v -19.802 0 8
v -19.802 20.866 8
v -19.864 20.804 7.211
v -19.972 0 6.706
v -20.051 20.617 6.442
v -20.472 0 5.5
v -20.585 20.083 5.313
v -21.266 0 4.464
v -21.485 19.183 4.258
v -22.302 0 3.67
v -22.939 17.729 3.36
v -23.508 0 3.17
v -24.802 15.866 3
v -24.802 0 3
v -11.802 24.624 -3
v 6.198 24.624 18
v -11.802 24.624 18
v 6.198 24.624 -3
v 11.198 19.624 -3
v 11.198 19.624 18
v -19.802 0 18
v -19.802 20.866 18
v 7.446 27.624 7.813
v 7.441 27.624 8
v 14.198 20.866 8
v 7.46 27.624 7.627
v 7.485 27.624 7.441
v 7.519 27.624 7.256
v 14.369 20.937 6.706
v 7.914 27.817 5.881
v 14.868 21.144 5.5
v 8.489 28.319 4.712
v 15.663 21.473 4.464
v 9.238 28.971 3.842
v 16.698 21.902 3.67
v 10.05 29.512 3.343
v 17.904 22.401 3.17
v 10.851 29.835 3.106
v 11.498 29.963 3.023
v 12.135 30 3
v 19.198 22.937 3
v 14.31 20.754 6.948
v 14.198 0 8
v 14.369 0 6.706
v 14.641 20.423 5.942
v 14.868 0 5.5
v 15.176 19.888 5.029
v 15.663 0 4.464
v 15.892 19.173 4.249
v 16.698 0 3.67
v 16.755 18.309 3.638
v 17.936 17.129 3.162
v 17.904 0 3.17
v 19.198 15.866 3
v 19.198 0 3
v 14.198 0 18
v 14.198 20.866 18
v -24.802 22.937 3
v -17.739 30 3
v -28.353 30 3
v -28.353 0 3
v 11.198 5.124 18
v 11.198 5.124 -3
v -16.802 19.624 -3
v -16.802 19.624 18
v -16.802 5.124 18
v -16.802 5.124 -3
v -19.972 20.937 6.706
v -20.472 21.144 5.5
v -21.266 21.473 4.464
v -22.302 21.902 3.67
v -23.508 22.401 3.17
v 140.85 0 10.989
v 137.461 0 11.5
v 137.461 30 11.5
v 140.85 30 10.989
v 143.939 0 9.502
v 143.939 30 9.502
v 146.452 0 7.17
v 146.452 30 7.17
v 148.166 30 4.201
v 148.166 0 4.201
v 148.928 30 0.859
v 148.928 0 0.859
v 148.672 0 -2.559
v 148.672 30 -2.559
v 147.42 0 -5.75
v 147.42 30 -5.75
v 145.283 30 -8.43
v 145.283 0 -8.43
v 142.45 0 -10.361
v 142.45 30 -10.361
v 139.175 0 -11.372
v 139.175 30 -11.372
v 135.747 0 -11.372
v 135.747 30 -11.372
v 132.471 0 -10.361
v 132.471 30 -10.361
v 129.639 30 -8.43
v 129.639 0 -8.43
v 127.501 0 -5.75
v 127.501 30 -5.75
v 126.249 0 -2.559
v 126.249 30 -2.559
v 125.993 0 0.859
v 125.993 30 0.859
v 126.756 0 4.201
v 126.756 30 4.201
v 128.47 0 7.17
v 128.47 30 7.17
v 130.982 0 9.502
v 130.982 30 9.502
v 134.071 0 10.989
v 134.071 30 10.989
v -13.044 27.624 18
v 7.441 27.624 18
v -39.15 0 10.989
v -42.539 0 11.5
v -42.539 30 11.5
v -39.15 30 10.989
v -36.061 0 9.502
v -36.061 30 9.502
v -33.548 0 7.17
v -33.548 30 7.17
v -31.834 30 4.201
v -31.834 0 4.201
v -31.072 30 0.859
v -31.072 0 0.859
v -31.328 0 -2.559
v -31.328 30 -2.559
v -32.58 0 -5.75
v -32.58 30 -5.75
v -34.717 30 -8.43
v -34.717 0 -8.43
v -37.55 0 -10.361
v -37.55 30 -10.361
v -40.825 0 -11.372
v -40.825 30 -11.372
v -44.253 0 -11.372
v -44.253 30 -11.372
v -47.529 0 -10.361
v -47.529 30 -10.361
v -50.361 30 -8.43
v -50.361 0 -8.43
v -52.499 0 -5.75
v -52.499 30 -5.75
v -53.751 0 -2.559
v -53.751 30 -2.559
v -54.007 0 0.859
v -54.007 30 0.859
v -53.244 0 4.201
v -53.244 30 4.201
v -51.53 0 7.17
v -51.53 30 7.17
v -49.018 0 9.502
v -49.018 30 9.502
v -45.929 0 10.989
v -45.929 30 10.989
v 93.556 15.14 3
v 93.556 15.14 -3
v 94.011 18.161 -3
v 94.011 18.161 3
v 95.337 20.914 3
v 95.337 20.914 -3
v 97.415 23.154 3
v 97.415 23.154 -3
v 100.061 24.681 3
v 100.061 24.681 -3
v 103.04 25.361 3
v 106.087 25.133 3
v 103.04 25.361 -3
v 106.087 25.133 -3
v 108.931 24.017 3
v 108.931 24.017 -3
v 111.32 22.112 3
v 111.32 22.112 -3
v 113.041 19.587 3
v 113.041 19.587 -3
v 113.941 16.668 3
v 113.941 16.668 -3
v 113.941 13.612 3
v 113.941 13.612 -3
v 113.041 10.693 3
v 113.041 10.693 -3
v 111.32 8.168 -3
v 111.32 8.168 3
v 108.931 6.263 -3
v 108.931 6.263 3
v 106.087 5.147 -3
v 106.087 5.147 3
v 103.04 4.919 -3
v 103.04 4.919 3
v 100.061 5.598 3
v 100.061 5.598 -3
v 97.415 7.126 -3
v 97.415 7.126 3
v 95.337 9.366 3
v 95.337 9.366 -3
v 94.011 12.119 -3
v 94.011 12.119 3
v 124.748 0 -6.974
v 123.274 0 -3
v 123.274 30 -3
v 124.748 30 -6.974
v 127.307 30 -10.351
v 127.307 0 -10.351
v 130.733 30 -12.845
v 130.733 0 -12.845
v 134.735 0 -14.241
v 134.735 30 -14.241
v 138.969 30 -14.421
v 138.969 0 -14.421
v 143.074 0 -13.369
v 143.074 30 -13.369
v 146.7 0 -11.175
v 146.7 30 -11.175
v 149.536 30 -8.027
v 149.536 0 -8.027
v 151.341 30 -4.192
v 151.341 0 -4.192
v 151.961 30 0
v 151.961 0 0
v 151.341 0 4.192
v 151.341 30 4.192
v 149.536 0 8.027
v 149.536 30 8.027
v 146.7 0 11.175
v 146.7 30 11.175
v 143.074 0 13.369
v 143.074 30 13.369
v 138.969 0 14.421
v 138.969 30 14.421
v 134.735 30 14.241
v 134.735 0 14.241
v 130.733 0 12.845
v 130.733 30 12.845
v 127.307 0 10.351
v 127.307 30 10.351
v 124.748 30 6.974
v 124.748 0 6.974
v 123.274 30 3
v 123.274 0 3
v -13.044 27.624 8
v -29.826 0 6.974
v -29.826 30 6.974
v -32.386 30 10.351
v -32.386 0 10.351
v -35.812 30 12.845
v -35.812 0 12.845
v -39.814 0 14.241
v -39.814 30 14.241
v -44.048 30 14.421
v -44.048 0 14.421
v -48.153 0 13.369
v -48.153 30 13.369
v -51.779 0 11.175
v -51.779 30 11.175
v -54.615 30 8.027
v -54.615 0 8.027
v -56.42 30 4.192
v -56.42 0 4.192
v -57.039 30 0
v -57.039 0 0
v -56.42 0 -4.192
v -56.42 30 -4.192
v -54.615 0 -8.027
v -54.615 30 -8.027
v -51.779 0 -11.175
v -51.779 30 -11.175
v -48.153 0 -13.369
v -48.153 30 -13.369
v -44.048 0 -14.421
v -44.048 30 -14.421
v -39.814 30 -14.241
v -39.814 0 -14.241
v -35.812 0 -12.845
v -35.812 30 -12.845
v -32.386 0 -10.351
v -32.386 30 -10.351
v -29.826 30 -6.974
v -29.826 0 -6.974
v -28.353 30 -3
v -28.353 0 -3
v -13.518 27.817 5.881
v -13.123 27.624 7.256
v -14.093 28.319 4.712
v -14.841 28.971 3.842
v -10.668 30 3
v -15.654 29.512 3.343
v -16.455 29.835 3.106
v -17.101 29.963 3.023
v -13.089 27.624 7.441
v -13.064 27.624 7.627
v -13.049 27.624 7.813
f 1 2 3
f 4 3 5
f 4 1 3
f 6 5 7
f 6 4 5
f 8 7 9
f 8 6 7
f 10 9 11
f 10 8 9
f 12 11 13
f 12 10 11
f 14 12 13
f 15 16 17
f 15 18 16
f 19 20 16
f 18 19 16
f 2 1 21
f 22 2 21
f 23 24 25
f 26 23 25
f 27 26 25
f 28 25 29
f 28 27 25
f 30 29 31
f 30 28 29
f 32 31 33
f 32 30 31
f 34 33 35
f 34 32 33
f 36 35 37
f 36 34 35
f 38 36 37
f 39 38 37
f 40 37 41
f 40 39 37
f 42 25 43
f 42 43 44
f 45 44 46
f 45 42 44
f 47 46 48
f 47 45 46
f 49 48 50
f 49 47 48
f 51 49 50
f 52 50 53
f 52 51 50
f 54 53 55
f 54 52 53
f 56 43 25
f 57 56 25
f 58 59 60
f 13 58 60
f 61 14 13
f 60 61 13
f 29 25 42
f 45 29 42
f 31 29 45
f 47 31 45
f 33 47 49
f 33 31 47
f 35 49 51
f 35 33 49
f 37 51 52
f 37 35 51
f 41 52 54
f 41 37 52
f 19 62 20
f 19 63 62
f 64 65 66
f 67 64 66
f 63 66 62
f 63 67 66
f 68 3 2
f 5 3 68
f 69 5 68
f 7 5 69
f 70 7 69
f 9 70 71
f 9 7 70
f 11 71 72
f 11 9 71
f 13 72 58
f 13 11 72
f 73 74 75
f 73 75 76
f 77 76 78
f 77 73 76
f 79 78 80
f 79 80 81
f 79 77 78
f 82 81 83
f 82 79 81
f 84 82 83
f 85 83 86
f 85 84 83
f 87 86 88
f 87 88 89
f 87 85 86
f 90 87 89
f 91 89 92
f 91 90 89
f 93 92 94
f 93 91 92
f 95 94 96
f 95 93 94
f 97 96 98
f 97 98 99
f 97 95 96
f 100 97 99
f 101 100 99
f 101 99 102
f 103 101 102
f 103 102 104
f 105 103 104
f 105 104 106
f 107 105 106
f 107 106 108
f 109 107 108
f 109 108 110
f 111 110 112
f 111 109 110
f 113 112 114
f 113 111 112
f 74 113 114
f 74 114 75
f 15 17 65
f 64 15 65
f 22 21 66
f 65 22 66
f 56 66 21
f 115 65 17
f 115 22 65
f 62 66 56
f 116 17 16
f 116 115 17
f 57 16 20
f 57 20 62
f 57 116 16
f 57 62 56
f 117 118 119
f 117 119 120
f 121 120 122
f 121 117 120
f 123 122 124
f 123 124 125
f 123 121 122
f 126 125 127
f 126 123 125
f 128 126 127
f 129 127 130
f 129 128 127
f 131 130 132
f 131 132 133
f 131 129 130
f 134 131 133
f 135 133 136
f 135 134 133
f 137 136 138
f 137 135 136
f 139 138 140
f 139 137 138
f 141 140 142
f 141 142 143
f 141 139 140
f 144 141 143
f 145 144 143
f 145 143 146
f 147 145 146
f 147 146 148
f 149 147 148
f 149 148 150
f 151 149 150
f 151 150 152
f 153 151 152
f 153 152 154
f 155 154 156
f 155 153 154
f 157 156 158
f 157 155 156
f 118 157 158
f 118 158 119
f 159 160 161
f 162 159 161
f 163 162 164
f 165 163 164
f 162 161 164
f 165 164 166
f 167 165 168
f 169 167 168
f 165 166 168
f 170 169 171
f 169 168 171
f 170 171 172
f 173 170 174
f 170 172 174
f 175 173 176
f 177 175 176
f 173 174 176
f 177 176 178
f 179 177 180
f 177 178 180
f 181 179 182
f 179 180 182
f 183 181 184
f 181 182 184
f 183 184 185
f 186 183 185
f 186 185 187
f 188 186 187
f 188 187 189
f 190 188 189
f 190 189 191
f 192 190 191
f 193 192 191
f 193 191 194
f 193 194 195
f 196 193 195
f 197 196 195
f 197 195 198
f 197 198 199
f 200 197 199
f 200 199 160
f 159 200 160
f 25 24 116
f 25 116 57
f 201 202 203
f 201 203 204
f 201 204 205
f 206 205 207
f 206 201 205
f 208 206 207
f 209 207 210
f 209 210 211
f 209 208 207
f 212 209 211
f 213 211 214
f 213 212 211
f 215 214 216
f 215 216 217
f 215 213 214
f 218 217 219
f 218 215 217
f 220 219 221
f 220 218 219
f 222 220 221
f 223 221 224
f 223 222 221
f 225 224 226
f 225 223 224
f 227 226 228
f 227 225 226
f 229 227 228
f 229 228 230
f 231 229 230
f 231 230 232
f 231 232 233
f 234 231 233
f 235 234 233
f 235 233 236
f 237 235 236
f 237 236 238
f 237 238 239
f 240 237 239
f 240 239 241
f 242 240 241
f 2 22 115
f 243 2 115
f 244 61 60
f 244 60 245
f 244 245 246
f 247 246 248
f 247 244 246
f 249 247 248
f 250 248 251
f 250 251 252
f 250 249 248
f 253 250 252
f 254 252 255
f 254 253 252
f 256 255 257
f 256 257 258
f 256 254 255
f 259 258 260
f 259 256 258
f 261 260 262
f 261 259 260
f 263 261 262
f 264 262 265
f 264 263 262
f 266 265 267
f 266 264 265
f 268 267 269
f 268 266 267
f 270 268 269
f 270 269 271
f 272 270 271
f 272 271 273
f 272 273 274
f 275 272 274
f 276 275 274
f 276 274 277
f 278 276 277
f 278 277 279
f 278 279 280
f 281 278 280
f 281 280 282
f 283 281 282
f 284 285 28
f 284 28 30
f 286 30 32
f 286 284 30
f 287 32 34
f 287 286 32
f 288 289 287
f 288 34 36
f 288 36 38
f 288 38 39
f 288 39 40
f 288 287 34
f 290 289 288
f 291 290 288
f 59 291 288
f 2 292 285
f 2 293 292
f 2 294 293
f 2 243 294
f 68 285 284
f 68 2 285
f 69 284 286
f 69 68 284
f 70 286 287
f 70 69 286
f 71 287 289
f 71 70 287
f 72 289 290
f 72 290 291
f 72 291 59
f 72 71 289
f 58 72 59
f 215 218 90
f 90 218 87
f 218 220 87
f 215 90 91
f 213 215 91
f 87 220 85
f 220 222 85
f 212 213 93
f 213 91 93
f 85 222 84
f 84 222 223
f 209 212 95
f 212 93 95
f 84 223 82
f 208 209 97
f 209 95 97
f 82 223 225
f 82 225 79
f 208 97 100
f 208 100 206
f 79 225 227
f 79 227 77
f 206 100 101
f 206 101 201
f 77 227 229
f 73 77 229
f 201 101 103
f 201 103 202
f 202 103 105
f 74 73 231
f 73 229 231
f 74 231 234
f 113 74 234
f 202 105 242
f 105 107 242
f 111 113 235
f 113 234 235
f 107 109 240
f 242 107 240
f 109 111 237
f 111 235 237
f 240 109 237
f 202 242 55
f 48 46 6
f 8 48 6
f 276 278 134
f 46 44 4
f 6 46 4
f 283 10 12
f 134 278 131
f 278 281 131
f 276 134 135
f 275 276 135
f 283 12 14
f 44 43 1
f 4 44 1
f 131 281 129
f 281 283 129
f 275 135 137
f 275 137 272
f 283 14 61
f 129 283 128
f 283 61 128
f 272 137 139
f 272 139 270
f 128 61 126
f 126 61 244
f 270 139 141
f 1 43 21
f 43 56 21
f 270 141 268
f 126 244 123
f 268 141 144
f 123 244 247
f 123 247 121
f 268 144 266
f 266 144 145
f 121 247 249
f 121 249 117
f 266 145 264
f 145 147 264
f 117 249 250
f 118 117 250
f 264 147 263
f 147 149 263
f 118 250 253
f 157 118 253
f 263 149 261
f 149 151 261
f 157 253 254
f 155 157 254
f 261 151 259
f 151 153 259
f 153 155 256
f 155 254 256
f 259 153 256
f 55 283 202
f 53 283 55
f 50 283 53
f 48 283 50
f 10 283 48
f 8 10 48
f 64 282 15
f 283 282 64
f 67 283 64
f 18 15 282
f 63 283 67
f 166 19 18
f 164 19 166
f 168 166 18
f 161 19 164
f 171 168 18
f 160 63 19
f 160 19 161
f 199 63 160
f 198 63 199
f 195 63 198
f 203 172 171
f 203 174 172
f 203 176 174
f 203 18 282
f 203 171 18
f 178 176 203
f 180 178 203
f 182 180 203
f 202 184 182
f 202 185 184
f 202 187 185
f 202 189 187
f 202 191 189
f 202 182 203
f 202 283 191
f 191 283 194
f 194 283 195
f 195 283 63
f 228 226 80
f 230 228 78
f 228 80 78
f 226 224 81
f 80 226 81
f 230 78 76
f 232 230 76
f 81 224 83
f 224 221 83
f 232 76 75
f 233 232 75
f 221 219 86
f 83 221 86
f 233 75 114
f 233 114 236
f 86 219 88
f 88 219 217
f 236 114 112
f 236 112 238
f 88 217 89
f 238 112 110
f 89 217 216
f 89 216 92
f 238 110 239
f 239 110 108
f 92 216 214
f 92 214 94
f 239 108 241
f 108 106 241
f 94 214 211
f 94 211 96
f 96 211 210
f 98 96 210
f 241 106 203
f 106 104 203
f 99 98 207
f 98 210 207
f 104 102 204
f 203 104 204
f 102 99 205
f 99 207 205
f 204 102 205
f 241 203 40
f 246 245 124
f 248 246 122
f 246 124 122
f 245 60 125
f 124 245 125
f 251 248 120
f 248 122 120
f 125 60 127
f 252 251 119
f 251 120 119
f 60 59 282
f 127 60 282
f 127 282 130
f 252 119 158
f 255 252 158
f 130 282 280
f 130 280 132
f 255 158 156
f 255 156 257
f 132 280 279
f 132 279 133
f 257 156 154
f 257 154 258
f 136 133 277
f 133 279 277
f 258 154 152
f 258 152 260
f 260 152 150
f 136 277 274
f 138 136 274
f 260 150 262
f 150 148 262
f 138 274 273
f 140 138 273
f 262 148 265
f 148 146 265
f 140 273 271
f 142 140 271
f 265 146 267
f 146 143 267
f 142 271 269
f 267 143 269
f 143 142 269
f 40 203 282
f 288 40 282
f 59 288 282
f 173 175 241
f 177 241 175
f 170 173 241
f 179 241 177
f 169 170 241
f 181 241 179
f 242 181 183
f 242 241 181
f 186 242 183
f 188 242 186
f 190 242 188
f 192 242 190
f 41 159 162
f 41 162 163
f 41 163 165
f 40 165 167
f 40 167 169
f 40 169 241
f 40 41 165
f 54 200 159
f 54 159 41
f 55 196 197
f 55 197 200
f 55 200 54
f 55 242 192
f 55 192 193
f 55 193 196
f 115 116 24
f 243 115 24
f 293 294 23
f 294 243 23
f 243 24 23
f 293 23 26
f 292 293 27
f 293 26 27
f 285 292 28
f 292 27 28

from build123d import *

# Parameters (mm, degrees)
SKETCH1_R           = 11.5
BOSS_EXTRUDE1_DEPTH = 30
CUT_EXTRUDE1_DEPTH  = 10
BOSS_EXTRUDE2_DEPTH = 15
SKETCH4_W           = 34
SKETCH4_H           = 2.123618691
BOSS_EXTRUDE3_DEPTH = 15
FILLET1_R           = 5
SKETCH5_R           = 10.25
CUT_EXTRUDE2_DEPTH  = 15


with BuildPart() as part:
    # Sketch1 → Boss-Extrude1 (new body)
    with BuildSketch(Plane(origin=(0, 0, 0), x_dir=(1, 0, 0), z_dir=(0, 1, 0))):
        with BuildLine():
            Line((-28.353157483, 3), (123.274320599, 3))
            ThreePointArc((123.274320599, 3), (151.960581558, 0), (123.274320599, -3))
            Line((123.274320599, -3), (-28.353157483, -3))
            ThreePointArc((-28.353157483, -3), (-57.039418442, 0), (-28.353157483, 3))
        make_face()
        with Locations(Location((-42.539418442, 0, 0), (0, 0, 270))):
            Circle(SKETCH1_R, mode=Mode.SUBTRACT)
        with Locations(Location((137.460581558, 0, 0), (0, 0, 270))):
            Circle(SKETCH1_R, mode=Mode.SUBTRACT)
    extrude(amount=BOSS_EXTRUDE1_DEPTH)

    # Sketch2 → Cut-Extrude1 (cut)
    with BuildSketch(Plane.XY.offset(3)):
        Polygon((6.198144817, 24.623618691), (-11.801855183, 24.623618691), (-16.801855183, 19.623618691), (-16.801855183, 5.123618691), (11.198144817, 5.123618691), (11.198144817, 19.623618691), align=None)
    extrude(amount=-CUT_EXTRUDE1_DEPTH, mode=Mode.SUBTRACT)

    # Sketch3 → Boss-Extrude2 (add)
    with BuildSketch(Plane.XY.offset(3)):
        Polygon((-13.044495871, 27.623618691), (7.440785504, 27.623618691), (14.198144817, 20.866259379), (14.198144817, 2.123618691), (-19.801855183, 2.123618691), (-19.801855183, 20.866259379), align=None)
        Polygon((-11.801855183, 24.623618691), (-16.801855183, 19.623618691), (-16.801855183, 5.123618691), (11.198144817, 5.123618691), (11.198144817, 19.623618691), (6.198144817, 24.623618691), align=None, mode=Mode.SUBTRACT)
    extrude(amount=BOSS_EXTRUDE2_DEPTH)

    # Sketch4 → Boss-Extrude3 (add)
    with BuildSketch(Plane.XY.offset(3)):
        with Locations((-2.801855183, 1.061809346)):
            Rectangle(SKETCH4_W, SKETCH4_H)
    extrude(amount=BOSS_EXTRUDE3_DEPTH)

    # Fillet1
    # the kernel refuses this fillet: 5 mm, written as the material it adds along each edge
    with BuildSketch(Plane(origin=(-28.640689948, 12.027424614, 3), x_dir=(-0.7071067811865481, 0.7071067811865469, 0), z_dir=(0.707106781186547, 0.7071067811865481, 0))) as fillet1_piece_1_section:
        with BuildLine():
            CenterArc((FILLET1_R, FILLET1_R), FILLET1_R, 180, 90)
            Line((0, FILLET1_R), (0, 0))
            Line((0, 0), (FILLET1_R, 0))
        make_face()
    fillet1_piece_1 = extrude(amount=34.556349186, mode=Mode.PRIVATE)
    fillet1_piece_1 = split(fillet1_piece_1, bisect_by=Plane(origin=(-28.640689948, 27.623618691, 3), z_dir=(0, -1, 0)), keep=Keep.TOP, mode=Mode.PRIVATE)
    fillet1_piece_1 = split(fillet1_piece_1, bisect_by=Plane(origin=(-19.801855183, 12.027424614, 3), z_dir=(1, 0, 0)), keep=Keep.TOP, mode=Mode.PRIVATE)
    add(fillet1_piece_1)
    with BuildSketch(Plane(origin=(-28.640689948, 12.027424614, 3), x_dir=(-0.7071067811865481, 0.7071067811865469, 0), z_dir=(0.707106781186547, 0.7071067811865481, 0))) as fillet1_piece_2_section:
        with BuildLine():
            CenterArc((FILLET1_R, FILLET1_R), FILLET1_R, 180, 90)
            Line((0, FILLET1_R), (0, 0))
            Line((0, 0), (FILLET1_R, 0))
        make_face()
    fillet1_piece_2 = extrude(amount=34.556349186, mode=Mode.PRIVATE)
    fillet1_piece_2 = split(fillet1_piece_2, bisect_by=Plane(origin=(-28.640689948, 27.623618691, 3), z_dir=(0, 1, 0)), keep=Keep.TOP, mode=Mode.PRIVATE)
    fillet1_piece_2 = split(fillet1_piece_2, bisect_by=Plane(origin=(-19.801855183, 12.027424614, 3), z_dir=(-1, 0, 0)), keep=Keep.TOP, mode=Mode.PRIVATE)
    add(fillet1_piece_2)
    with BuildSketch(Plane(origin=(-19.801855183, 0, 3), x_dir=(-1, 0, 0), z_dir=(0, 1, 0))) as fillet1_piece_3_section:
        with BuildLine():
            CenterArc((FILLET1_R, FILLET1_R), FILLET1_R, 180, 90)
            Line((0, FILLET1_R), (0, 0))
            Line((0, 0), (FILLET1_R, 0))
        make_face()
    fillet1_piece_3 = extrude(amount=33.366259379, mode=Mode.PRIVATE)
    fillet1_piece_3 = split(fillet1_piece_3, bisect_by=Plane(origin=(-30.234984873, 10.433129689, 3), z_dir=(0.7071067811865481, -0.707106781186547, 0)), keep=Keep.TOP, mode=Mode.PRIVATE)
    add(fillet1_piece_3)
    with BuildSketch(Plane(origin=(14.198144817, 33.366259379, 3), x_dir=(1, 0, 0), z_dir=(0, -1, 0))) as fillet1_piece_4_section:
        with BuildLine():
            CenterArc((FILLET1_R, FILLET1_R), FILLET1_R, 180, 90)
            Line((0, FILLET1_R), (0, 0))
            Line((0, 0), (FILLET1_R, 0))
        make_face()
    fillet1_piece_4 = extrude(amount=33.366259379, mode=Mode.PRIVATE)
    fillet1_piece_4 = split(fillet1_piece_4, bisect_by=Plane(origin=(7.948144817, 27.116259379, 3), z_dir=(-0.7071067811865476, -0.7071067811865476, 0)), keep=Keep.TOP, mode=Mode.PRIVATE)
    add(fillet1_piece_4)
    with BuildSketch(Plane(origin=(-1.398049261, 36.462453456, 3), x_dir=(0.7071067811865475, 0.7071067811865475, 0), z_dir=(0.7071067811865476, -0.7071067811865476, 0))) as fillet1_piece_5_section:
        with BuildLine():
            CenterArc((FILLET1_R, FILLET1_R), FILLET1_R, 180, 90)
            Line((0, FILLET1_R), (0, 0))
            Line((0, 0), (FILLET1_R, 0))
        make_face()
    fillet1_piece_5 = extrude(amount=34.556349186, mode=Mode.PRIVATE)
    fillet1_piece_5 = split(fillet1_piece_5, bisect_by=Plane(origin=(14.198144817, 36.462453456, 3), z_dir=(-1, 0, 0)), keep=Keep.TOP, mode=Mode.PRIVATE)
    fillet1_piece_5 = split(fillet1_piece_5, bisect_by=Plane(origin=(-1.398049261, 27.623618691, 3), z_dir=(0, -1, 0)), keep=Keep.TOP, mode=Mode.PRIVATE)
    add(fillet1_piece_5)
    with BuildSketch(Plane(origin=(-1.398049261, 36.462453456, 3), x_dir=(0.7071067811865475, 0.7071067811865475, 0), z_dir=(0.7071067811865476, -0.7071067811865476, 0))) as fillet1_piece_6_section:
        with BuildLine():
            CenterArc((FILLET1_R, FILLET1_R), FILLET1_R, 180, 90)
            Line((0, FILLET1_R), (0, 0))
            Line((0, 0), (FILLET1_R, 0))
        make_face()
    fillet1_piece_6 = extrude(amount=34.556349186, mode=Mode.PRIVATE)
    fillet1_piece_6 = split(fillet1_piece_6, bisect_by=Plane(origin=(14.198144817, 36.462453456, 3), z_dir=(1, 0, 0)), keep=Keep.TOP, mode=Mode.PRIVATE)
    fillet1_piece_6 = split(fillet1_piece_6, bisect_by=Plane(origin=(-1.398049261, 27.623618691, 3), z_dir=(0, 1, 0)), keep=Keep.TOP, mode=Mode.PRIVATE)
    add(fillet1_piece_6)
    with BuildSketch(Plane(origin=(-23.685403069, 27.623618691, 3), x_dir=(0, 1, 0), z_dir=(1, 0, 0))) as fillet1_piece_7_section:
        with BuildLine():
            CenterArc((5, 4.256362879), FILLET1_R, 180, 58.350352686)
            Line((0, 4.256362879), (0, 0))
            Line((0, 0), (2.376381309, 0))
        make_face()
    fillet1_piece_7 = extrude(amount=41.767095772, mode=Mode.PRIVATE)
    fillet1_piece_7 = split(fillet1_piece_7, bisect_by=Plane(origin=(-8.122308783, 43.186712978, 3), z_dir=(-0.7071067811865476, -0.7071067811865476, 0)), keep=Keep.TOP, mode=Mode.PRIVATE)
    fillet1_piece_7 = split(fillet1_piece_7, bisect_by=Plane(origin=(-18.36494947, 22.303165092, 3), z_dir=(0.7071067811865481, -0.707106781186547, 0)), keep=Keep.TOP, mode=Mode.PRIVATE)
    add(fillet1_piece_7)
    with BuildSketch(Plane(origin=(-19.801855183, 0, 3), x_dir=(-1, 0, 0), z_dir=(0, 1, 0))) as fillet1_piece_8a_section:
        with BuildLine():
            CenterArc((FILLET1_R, FILLET1_R), FILLET1_R, 180, 90)
            Line((0, FILLET1_R), (0, 0))
            Line((0, 0), (FILLET1_R, 0))
        make_face()
    fillet1_piece_8a = extrude(amount=33.366259379, mode=Mode.PRIVATE)
    fillet1_piece_8a = split(fillet1_piece_8a, bisect_by=Plane(origin=(-30.234984873, 10.433129689, 3), z_dir=(-0.7071067811865481, 0.707106781186547, 0)), keep=Keep.TOP, mode=Mode.PRIVATE)
    fillet1_piece_8a = split(fillet1_piece_8a, bisect_by=Plane(origin=(-19.801855183, 30, 3), z_dir=(0, -1, 0)), keep=Keep.TOP, mode=Mode.PRIVATE)
    with BuildSketch(Plane(origin=(-28.640689948, 12.027424614, 3), x_dir=(-0.7071067811865481, 0.7071067811865469, 0), z_dir=(0.707106781186547, 0.7071067811865481, 0))) as fillet1_piece_8b_section:
        with BuildLine():
            CenterArc((FILLET1_R, FILLET1_R), FILLET1_R, 180, 90)
            Line((0, FILLET1_R), (0, 0))
            Line((0, 0), (FILLET1_R, 0))
        make_face()
    fillet1_piece_8b = extrude(amount=34.556349186, mode=Mode.PRIVATE)
    fillet1_piece_8b = split(fillet1_piece_8b, bisect_by=Plane(origin=(-19.801855183, 12.027424614, 3), z_dir=(-1, 0, 0)), keep=Keep.TOP, mode=Mode.PRIVATE)
    fillet1_piece_8b = fillet1_piece_8b - Plane(origin=(-42.539418442, 12.027424614, 0), x_dir=(0.9783628247662832, 0, 0.20689655172413826), z_dir=(0, -1, 0)) * Cylinder(14.5, 90, mode=Mode.PRIVATE)
    fillet1_piece_8 = fillet1_piece_8a & fillet1_piece_8b
    add(fillet1_piece_8)
    with BuildSketch(Plane(origin=(-28.640689948, 12.027424614, 3), x_dir=(-0.7071067811865481, 0.7071067811865469, 0), z_dir=(0.707106781186547, 0.7071067811865481, 0))) as fillet1_piece_9a_section:
        with BuildLine():
            CenterArc((FILLET1_R, FILLET1_R), FILLET1_R, 180, 90)
            Line((0, FILLET1_R), (0, 0))
            Line((0, 0), (FILLET1_R, 0))
        make_face()
    fillet1_piece_9a = extrude(amount=34.556349186, mode=Mode.PRIVATE)
    fillet1_piece_9a = split(fillet1_piece_9a, bisect_by=Plane(origin=(-28.640689948, 27.623618691, 3), z_dir=(0, 1, 0)), keep=Keep.TOP, mode=Mode.PRIVATE)
    fillet1_piece_9a = split(fillet1_piece_9a, bisect_by=Plane(origin=(-28.640689948, 30, 3), z_dir=(0, -1, 0)), keep=Keep.TOP, mode=Mode.PRIVATE)
    with BuildSketch(Plane(origin=(-23.685403069, 27.623618691, 3), x_dir=(0, 1, 0), z_dir=(1, 0, 0))) as fillet1_piece_9b_section:
        with BuildLine():
            CenterArc((5, 4.256362879), FILLET1_R, 180, 58.350352686)
            Line((0, 4.256362879), (0, 0))
            Line((0, 0), (2.376381309, 0))
        make_face()
    fillet1_piece_9b = extrude(amount=41.767095772, mode=Mode.PRIVATE)
    fillet1_piece_9b = split(fillet1_piece_9b, bisect_by=Plane(origin=(-18.36494947, 22.303165092, 3), z_dir=(-0.7071067811865481, 0.707106781186547, 0)), keep=Keep.TOP, mode=Mode.PRIVATE)
    fillet1_piece_9 = fillet1_piece_9a & fillet1_piece_9b
    add(fillet1_piece_9)
    with BuildSketch(Plane(origin=(-1.398049261, 36.462453456, 3), x_dir=(0.7071067811865475, 0.7071067811865475, 0), z_dir=(0.7071067811865476, -0.7071067811865476, 0))) as fillet1_piece_10a_section:
        with BuildLine():
            CenterArc((FILLET1_R, FILLET1_R), FILLET1_R, 180, 90)
            Line((0, FILLET1_R), (0, 0))
            Line((0, 0), (FILLET1_R, 0))
        make_face()
    fillet1_piece_10a = extrude(amount=34.556349186, mode=Mode.PRIVATE)
    fillet1_piece_10a = split(fillet1_piece_10a, bisect_by=Plane(origin=(14.198144817, 36.462453456, 3), z_dir=(1, 0, 0)), keep=Keep.TOP, mode=Mode.PRIVATE)
    with BuildSketch(Plane(origin=(14.198144817, 33.366259379, 3), x_dir=(1, 0, 0), z_dir=(0, -1, 0))) as fillet1_piece_10b_section:
        with BuildLine():
            CenterArc((FILLET1_R, FILLET1_R), FILLET1_R, 180, 90)
            Line((0, FILLET1_R), (0, 0))
            Line((0, 0), (FILLET1_R, 0))
        make_face()
    fillet1_piece_10b = extrude(amount=33.366259379, mode=Mode.PRIVATE)
    fillet1_piece_10b = split(fillet1_piece_10b, bisect_by=Plane(origin=(7.948144817, 27.116259379, 3), z_dir=(0.7071067811865476, 0.7071067811865476, 0)), keep=Keep.TOP, mode=Mode.PRIVATE)
    fillet1_piece_10b = split(fillet1_piece_10b, bisect_by=Plane(origin=(14.198144817, 30, 3), z_dir=(0, -1, 0)), keep=Keep.TOP, mode=Mode.PRIVATE)
    fillet1_piece_10 = fillet1_piece_10a & fillet1_piece_10b
    add(fillet1_piece_10)
    with BuildSketch(Plane(origin=(-23.685403069, 27.623618691, 3), x_dir=(0, 1, 0), z_dir=(1, 0, 0))) as fillet1_piece_11a_section:
        with BuildLine():
            CenterArc((5, 4.256362879), FILLET1_R, 180, 58.350352686)
            Line((0, 4.256362879), (0, 0))
            Line((0, 0), (2.376381309, 0))
        make_face()
    fillet1_piece_11a = extrude(amount=41.767095772, mode=Mode.PRIVATE)
    fillet1_piece_11a = split(fillet1_piece_11a, bisect_by=Plane(origin=(-8.122308783, 43.186712978, 3), z_dir=(0.7071067811865476, 0.7071067811865476, 0)), keep=Keep.TOP, mode=Mode.PRIVATE)
    with BuildSketch(Plane(origin=(-1.398049261, 36.462453456, 3), x_dir=(0.7071067811865475, 0.7071067811865475, 0), z_dir=(0.7071067811865476, -0.7071067811865476, 0))) as fillet1_piece_11b_section:
        with BuildLine():
            CenterArc((FILLET1_R, FILLET1_R), FILLET1_R, 180, 90)
            Line((0, FILLET1_R), (0, 0))
            Line((0, 0), (FILLET1_R, 0))
        make_face()
    fillet1_piece_11b = extrude(amount=34.556349186, mode=Mode.PRIVATE)
    fillet1_piece_11b = split(fillet1_piece_11b, bisect_by=Plane(origin=(-1.398049261, 27.623618691, 3), z_dir=(0, 1, 0)), keep=Keep.TOP, mode=Mode.PRIVATE)
    fillet1_piece_11b = split(fillet1_piece_11b, bisect_by=Plane(origin=(-1.398049261, 30, 3), z_dir=(0, -1, 0)), keep=Keep.TOP, mode=Mode.PRIVATE)
    fillet1_piece_11 = fillet1_piece_11a & fillet1_piece_11b
    add(fillet1_piece_11)

    # Sketch5 → Cut-Extrude2 (cut)
    with BuildSketch(Plane(origin=(0, 0, -3), x_dir=(-1, 0, 0), z_dir=(0, 0, -1))):
        with Locations((-103.805830626, 15.139955724)):
            Circle(SKETCH5_R)
    extrude(amount=-CUT_EXTRUDE2_DEPTH, mode=Mode.SUBTRACT)


solid = part.part
